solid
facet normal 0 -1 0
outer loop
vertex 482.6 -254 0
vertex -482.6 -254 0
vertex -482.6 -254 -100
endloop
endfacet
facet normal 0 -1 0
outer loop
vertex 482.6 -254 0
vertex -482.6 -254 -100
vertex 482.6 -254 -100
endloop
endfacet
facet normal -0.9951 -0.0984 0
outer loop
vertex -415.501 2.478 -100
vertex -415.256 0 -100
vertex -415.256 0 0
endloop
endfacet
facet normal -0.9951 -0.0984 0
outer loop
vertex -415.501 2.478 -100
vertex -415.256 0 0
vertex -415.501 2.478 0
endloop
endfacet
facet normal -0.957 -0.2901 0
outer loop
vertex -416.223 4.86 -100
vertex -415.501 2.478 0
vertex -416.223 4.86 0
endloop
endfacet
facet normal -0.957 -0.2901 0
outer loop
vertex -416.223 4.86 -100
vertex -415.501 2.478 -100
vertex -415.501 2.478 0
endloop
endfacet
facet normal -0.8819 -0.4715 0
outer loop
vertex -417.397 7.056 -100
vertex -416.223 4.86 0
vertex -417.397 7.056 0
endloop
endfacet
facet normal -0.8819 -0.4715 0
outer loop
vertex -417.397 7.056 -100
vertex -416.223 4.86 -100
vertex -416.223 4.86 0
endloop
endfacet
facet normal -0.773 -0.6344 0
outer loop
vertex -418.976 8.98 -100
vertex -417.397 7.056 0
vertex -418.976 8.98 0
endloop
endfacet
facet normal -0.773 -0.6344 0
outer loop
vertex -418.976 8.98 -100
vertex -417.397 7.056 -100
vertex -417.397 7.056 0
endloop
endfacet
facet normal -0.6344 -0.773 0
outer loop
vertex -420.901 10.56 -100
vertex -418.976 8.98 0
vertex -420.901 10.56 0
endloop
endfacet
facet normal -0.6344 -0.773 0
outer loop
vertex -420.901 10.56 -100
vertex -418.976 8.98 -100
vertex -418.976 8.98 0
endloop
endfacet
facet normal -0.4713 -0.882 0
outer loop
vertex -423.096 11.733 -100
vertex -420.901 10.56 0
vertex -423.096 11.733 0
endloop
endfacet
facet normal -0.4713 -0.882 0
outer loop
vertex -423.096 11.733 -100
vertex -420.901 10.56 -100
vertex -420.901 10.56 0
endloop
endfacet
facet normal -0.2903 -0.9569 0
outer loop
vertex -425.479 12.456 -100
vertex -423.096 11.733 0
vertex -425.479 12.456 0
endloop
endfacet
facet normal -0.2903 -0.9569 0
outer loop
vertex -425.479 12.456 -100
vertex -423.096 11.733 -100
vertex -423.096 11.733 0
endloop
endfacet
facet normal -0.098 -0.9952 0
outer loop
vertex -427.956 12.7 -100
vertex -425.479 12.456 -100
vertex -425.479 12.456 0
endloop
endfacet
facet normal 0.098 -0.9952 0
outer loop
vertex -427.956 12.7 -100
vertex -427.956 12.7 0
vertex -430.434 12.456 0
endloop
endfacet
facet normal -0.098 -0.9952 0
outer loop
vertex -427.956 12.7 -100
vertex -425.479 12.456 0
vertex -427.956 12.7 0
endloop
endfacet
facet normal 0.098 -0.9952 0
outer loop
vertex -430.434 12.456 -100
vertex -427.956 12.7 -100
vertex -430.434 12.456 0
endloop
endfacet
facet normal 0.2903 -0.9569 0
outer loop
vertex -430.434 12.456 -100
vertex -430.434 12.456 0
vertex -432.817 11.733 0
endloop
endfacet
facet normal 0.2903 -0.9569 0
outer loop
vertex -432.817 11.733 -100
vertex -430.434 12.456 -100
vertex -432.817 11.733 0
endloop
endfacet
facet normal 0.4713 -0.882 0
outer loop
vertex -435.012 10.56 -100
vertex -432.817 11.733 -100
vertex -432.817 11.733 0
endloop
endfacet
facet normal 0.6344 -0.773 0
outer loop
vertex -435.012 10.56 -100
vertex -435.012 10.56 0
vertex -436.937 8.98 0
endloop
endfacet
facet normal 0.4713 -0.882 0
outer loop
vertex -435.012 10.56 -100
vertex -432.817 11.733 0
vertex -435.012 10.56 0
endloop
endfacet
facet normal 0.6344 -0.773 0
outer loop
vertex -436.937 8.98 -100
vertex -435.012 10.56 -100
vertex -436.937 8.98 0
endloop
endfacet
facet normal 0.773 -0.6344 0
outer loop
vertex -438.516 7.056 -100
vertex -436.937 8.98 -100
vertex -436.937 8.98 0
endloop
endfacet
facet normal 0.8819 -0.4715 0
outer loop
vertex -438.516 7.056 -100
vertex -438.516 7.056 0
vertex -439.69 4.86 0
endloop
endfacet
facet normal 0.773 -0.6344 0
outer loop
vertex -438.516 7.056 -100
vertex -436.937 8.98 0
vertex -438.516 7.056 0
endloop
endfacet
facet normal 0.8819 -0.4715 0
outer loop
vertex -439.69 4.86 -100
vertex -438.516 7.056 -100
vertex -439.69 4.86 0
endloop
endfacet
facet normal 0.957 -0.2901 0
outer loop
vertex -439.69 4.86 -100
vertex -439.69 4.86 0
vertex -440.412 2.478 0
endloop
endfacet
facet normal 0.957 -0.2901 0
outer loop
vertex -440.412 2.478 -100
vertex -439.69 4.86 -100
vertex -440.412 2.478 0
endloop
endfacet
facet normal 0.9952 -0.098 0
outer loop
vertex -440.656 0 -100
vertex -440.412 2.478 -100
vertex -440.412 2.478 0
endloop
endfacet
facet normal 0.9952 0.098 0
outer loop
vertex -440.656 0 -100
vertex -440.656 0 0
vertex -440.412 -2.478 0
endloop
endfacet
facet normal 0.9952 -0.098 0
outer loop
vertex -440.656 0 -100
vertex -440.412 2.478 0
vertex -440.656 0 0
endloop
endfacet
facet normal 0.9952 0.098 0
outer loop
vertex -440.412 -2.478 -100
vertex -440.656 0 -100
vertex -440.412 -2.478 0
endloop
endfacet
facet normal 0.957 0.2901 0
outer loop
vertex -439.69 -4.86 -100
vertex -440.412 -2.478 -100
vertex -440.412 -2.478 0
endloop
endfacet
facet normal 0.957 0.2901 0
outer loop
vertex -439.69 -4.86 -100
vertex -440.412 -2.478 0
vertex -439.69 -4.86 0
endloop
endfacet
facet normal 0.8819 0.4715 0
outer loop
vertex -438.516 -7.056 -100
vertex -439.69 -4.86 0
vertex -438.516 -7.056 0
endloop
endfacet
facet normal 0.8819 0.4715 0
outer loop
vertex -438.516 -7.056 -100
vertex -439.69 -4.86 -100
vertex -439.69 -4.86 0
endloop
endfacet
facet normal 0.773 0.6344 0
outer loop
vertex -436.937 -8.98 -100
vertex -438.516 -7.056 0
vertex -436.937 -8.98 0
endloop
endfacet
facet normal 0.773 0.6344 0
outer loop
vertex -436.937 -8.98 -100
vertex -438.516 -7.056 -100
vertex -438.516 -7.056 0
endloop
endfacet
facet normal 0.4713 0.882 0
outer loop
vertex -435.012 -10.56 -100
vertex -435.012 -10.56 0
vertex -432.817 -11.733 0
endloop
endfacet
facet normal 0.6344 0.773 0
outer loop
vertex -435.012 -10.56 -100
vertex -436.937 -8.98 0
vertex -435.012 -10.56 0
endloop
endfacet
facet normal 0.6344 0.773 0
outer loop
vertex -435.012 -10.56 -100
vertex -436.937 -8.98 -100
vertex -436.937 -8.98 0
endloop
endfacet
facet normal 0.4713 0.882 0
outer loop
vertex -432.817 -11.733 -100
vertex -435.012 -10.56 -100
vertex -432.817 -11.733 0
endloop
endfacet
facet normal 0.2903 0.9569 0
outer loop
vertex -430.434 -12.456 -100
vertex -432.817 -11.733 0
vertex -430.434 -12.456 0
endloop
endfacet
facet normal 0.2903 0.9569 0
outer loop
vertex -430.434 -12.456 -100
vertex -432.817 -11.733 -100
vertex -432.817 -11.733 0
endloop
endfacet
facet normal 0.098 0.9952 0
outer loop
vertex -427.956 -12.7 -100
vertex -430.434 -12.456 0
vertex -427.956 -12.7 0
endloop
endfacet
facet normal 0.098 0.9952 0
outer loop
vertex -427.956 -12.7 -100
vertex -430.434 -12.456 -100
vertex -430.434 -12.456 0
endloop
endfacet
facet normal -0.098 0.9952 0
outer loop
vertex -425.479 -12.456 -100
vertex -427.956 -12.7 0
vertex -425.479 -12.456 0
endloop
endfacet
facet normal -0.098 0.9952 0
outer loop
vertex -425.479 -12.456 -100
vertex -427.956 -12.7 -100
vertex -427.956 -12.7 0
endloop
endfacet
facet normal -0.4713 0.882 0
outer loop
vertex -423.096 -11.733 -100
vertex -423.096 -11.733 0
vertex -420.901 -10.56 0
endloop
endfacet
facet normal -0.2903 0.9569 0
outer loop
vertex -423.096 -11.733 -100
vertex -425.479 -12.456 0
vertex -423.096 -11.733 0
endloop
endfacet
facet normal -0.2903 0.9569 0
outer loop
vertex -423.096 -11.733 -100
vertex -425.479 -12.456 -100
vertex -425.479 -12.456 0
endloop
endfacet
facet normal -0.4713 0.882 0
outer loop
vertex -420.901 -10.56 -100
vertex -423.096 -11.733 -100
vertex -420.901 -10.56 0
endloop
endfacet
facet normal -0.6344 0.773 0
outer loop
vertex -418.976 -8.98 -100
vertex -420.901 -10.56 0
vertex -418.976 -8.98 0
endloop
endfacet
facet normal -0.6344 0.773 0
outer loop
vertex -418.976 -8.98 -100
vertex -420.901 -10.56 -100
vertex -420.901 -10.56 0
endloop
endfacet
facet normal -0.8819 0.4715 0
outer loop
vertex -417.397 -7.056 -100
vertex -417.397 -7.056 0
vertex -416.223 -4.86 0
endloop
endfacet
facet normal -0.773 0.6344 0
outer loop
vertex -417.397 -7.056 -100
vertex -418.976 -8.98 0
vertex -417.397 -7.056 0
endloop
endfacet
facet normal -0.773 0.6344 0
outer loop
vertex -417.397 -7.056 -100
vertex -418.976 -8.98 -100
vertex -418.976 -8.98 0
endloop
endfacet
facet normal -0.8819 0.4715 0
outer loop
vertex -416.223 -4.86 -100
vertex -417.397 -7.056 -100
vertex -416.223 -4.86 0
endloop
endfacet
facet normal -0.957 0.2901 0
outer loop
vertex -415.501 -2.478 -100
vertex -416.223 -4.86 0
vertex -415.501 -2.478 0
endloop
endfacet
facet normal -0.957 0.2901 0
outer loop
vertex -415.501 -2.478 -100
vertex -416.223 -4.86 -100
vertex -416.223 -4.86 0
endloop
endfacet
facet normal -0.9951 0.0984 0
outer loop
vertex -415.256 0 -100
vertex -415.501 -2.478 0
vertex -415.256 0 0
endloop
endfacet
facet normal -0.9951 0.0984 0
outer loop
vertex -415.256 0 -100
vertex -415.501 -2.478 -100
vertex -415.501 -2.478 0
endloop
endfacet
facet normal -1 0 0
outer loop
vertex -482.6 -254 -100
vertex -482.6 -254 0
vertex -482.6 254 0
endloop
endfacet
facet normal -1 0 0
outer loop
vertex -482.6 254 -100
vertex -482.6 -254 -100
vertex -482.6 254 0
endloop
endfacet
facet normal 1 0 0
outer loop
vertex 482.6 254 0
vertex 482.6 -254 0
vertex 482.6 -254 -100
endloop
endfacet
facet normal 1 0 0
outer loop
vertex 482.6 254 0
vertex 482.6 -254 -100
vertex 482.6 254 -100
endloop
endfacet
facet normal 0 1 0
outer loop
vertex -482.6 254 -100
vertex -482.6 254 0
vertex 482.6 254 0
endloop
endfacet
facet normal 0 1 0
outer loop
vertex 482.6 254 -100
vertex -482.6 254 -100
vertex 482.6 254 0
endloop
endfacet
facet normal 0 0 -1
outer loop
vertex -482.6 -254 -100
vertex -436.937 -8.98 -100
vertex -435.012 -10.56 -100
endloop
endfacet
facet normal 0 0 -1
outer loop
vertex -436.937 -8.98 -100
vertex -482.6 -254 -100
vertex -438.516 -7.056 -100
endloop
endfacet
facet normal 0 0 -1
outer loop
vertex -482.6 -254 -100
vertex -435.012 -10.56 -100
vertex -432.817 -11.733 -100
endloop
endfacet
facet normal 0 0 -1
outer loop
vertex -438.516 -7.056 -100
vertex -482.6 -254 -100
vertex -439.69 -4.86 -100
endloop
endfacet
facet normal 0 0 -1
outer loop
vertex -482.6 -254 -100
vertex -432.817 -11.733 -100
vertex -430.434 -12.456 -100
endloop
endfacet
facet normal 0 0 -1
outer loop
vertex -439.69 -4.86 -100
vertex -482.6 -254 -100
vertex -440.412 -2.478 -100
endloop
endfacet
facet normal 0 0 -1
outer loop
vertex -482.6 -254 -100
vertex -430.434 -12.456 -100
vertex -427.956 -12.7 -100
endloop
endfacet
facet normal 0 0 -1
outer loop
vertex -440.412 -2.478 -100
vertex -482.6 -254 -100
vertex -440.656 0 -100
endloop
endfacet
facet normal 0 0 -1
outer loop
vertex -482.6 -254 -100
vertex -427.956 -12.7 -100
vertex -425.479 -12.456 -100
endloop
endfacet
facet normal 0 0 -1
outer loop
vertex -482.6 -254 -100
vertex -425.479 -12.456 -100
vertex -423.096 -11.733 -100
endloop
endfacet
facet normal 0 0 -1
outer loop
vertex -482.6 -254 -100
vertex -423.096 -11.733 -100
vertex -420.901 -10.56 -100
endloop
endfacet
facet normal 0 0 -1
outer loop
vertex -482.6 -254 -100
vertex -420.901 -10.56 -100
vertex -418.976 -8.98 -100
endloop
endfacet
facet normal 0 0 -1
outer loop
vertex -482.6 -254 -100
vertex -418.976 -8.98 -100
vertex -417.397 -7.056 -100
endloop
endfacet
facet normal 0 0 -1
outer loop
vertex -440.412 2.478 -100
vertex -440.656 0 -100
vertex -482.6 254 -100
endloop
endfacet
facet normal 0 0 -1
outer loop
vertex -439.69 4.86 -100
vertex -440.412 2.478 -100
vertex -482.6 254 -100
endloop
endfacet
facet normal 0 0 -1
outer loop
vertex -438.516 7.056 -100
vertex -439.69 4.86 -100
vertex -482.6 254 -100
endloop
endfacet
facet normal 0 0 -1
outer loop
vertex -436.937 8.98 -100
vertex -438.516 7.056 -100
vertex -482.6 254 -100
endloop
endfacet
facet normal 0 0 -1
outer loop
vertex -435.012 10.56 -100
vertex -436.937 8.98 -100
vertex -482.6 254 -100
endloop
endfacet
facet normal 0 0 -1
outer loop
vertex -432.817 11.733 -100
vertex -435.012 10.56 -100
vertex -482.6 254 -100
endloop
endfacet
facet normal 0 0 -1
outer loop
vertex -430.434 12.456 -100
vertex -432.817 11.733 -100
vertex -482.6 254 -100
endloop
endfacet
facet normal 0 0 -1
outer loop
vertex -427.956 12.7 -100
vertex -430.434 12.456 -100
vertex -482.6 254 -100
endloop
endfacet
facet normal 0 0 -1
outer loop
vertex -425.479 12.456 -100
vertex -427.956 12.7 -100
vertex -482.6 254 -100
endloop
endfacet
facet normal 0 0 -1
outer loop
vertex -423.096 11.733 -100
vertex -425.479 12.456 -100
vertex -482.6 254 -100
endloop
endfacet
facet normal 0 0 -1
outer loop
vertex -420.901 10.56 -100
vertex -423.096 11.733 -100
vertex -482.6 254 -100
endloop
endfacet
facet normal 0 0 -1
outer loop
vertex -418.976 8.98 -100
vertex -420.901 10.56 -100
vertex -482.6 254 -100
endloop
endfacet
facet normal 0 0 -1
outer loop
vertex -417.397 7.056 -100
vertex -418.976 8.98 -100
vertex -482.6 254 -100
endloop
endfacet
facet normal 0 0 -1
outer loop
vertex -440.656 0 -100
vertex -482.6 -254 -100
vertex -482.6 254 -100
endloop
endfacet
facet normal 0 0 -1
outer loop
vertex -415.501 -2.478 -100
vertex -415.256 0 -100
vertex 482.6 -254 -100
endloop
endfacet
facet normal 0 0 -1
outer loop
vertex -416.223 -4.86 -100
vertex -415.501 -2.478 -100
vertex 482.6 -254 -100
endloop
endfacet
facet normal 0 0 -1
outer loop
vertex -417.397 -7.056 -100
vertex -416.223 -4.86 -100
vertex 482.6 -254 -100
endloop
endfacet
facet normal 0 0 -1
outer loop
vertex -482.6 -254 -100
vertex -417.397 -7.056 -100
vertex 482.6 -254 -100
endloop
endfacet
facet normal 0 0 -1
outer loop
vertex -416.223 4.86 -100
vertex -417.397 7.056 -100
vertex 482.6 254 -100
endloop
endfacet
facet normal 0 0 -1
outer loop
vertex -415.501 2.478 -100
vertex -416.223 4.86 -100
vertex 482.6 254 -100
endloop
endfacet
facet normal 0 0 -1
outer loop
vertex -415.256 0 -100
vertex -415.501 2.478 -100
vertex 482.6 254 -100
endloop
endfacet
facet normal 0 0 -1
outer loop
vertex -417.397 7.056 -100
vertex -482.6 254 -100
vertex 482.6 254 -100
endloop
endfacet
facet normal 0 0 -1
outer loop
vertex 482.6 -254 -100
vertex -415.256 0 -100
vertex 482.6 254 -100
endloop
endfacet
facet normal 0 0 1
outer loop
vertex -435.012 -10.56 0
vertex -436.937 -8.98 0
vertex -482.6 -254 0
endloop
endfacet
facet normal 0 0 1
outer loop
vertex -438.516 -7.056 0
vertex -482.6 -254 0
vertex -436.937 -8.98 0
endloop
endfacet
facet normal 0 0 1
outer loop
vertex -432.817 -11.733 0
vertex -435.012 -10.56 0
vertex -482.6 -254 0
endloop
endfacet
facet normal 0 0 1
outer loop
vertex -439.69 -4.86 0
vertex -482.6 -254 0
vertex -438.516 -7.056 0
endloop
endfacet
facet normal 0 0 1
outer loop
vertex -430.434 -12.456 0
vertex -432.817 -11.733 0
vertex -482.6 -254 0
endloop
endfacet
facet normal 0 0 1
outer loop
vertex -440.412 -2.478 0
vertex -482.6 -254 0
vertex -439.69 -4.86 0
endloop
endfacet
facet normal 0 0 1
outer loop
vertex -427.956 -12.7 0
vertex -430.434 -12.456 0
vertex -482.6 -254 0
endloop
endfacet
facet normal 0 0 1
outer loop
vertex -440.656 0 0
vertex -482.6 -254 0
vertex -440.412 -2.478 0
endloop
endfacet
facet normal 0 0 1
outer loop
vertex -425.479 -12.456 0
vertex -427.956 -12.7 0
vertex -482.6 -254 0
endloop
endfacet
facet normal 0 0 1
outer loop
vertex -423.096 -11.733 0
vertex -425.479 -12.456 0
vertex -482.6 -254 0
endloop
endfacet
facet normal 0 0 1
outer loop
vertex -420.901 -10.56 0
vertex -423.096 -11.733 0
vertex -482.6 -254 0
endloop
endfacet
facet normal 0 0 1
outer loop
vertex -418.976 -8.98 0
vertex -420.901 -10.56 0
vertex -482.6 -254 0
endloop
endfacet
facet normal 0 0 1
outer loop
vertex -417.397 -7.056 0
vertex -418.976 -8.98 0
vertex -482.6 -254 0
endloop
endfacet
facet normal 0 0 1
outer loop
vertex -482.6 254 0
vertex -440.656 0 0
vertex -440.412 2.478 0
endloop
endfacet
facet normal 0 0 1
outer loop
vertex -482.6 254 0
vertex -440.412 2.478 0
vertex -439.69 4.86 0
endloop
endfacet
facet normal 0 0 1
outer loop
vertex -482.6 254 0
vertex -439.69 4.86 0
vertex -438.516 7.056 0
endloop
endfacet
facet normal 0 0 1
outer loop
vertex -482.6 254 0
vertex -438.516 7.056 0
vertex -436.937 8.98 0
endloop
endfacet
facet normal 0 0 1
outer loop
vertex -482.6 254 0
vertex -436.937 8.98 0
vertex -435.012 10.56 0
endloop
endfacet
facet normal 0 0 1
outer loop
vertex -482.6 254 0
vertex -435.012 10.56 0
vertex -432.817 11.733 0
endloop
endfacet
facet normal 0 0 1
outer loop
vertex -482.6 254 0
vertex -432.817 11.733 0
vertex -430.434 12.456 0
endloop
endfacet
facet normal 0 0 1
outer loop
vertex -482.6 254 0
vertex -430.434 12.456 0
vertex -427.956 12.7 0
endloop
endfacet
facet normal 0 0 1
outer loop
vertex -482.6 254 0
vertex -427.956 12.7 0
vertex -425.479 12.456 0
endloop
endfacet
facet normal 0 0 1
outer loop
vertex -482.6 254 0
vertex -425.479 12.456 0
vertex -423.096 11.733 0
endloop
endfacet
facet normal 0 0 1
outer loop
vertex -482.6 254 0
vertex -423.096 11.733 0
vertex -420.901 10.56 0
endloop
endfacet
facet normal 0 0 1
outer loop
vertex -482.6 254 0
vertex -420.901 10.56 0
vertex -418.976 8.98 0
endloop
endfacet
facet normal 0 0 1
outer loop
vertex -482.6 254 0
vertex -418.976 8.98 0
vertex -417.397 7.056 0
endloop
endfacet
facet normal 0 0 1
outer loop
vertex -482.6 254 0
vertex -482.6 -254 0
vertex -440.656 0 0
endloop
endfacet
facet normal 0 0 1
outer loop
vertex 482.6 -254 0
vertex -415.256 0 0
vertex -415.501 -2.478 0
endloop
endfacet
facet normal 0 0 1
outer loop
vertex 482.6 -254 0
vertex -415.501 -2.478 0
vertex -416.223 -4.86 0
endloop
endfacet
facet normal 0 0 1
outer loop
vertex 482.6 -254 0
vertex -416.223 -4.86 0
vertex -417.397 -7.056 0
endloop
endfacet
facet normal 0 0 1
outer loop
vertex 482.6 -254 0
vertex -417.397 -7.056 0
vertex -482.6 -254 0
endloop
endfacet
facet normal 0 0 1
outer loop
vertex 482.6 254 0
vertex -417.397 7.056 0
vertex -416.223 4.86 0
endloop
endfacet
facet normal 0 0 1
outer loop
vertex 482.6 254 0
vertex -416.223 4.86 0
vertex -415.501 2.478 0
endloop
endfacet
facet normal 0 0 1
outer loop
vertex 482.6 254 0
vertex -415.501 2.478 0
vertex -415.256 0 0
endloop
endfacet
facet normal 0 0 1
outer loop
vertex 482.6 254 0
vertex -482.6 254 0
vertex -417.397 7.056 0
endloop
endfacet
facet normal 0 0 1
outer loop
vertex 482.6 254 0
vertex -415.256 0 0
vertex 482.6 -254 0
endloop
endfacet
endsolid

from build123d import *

# Parameters (mm, degrees)
SKETCH1_W               = 965.2
SKETCH1_H               = 508
BOSS_EXTRUDE1_DEPTH     = 100
CUT_EXTRUDE1_DEPTH      = 555.453568841
CUT_EXTRUDE1_DEPTH_BACK = 555.453568841
SKETCH2_R               = 12.7


with BuildPart() as part:
    # Sketch1 → Boss-Extrude1 (new body)
    with BuildSketch(Plane.XY):
        Rectangle(SKETCH1_W, SKETCH1_H)
    extrude(amount=-BOSS_EXTRUDE1_DEPTH)

    # Sketch2 → Cut-Extrude1 (cut, two sides: drawn at the far end of the back side and taken through both)
    with BuildSketch(Plane.XY.offset(-CUT_EXTRUDE1_DEPTH_BACK)):
        with Locations((-427.956480022, 0)):
            Circle(SKETCH2_R)
    extrude(amount=CUT_EXTRUDE1_DEPTH + CUT_EXTRUDE1_DEPTH_BACK, mode=Mode.SUBTRACT)


solid = part.part
